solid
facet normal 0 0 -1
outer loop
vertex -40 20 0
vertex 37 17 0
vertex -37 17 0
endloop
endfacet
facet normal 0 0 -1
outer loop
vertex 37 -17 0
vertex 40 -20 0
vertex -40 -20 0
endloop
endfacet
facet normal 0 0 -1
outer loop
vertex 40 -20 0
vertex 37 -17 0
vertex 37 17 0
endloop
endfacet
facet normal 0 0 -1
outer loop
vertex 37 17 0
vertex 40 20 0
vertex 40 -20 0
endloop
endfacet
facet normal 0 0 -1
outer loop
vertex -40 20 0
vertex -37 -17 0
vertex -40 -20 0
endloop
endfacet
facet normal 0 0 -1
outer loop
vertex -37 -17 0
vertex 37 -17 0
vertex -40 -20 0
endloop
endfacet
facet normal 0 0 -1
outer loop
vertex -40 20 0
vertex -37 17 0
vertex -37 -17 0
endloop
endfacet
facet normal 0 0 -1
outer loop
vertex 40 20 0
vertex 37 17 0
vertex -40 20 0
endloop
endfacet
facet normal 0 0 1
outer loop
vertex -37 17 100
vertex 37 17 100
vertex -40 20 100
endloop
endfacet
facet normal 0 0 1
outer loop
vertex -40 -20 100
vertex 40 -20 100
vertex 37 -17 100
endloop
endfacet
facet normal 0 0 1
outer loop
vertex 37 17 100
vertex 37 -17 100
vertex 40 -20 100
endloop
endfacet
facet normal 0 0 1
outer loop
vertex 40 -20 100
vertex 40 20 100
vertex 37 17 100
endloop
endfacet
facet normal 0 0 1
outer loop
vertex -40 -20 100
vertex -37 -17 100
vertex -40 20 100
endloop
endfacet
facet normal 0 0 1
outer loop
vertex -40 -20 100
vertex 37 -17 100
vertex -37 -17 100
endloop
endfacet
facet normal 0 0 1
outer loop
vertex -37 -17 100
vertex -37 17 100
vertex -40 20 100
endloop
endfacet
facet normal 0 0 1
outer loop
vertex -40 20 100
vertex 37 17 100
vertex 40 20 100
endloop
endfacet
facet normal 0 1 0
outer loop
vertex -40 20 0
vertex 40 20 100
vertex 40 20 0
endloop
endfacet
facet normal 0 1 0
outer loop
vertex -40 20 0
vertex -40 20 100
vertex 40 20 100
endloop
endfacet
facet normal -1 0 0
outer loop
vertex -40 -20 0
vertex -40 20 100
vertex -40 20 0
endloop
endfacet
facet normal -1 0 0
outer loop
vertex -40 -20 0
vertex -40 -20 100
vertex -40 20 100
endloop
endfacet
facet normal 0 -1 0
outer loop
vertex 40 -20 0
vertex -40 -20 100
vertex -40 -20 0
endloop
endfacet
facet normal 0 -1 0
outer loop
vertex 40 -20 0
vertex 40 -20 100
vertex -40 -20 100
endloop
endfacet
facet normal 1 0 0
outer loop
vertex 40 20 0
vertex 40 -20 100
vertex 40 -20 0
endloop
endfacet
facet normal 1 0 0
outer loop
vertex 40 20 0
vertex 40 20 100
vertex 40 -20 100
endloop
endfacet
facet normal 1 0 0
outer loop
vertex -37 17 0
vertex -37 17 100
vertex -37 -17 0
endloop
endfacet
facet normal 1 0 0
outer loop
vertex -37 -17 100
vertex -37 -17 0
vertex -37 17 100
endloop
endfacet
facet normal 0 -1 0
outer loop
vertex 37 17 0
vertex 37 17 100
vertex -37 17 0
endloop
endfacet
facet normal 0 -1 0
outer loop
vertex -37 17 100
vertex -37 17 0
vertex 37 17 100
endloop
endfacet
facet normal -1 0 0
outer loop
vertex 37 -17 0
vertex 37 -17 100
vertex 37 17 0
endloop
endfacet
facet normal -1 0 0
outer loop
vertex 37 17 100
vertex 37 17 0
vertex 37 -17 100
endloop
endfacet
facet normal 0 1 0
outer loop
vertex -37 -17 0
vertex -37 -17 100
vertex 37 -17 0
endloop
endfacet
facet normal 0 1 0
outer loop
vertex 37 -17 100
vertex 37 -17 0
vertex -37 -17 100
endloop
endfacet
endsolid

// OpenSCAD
$fn = 64;

// Parameters
length = 100;
w = 80;
h = 40;

// Simple 40x80 aluminum extrusion-like profile (outer rectangle with inner void)
wall = 3.0;
inner_w = w - 2*wall;
inner_h = h - 2*wall;

module extrusion_40x80(len=100) {
    linear_extrude(height=len, center=false, convexity=10)
        difference() {
            square([w, h], center=true);
            square([inner_w, inner_h], center=true);
        }
}

extrusion_40x80(length);
